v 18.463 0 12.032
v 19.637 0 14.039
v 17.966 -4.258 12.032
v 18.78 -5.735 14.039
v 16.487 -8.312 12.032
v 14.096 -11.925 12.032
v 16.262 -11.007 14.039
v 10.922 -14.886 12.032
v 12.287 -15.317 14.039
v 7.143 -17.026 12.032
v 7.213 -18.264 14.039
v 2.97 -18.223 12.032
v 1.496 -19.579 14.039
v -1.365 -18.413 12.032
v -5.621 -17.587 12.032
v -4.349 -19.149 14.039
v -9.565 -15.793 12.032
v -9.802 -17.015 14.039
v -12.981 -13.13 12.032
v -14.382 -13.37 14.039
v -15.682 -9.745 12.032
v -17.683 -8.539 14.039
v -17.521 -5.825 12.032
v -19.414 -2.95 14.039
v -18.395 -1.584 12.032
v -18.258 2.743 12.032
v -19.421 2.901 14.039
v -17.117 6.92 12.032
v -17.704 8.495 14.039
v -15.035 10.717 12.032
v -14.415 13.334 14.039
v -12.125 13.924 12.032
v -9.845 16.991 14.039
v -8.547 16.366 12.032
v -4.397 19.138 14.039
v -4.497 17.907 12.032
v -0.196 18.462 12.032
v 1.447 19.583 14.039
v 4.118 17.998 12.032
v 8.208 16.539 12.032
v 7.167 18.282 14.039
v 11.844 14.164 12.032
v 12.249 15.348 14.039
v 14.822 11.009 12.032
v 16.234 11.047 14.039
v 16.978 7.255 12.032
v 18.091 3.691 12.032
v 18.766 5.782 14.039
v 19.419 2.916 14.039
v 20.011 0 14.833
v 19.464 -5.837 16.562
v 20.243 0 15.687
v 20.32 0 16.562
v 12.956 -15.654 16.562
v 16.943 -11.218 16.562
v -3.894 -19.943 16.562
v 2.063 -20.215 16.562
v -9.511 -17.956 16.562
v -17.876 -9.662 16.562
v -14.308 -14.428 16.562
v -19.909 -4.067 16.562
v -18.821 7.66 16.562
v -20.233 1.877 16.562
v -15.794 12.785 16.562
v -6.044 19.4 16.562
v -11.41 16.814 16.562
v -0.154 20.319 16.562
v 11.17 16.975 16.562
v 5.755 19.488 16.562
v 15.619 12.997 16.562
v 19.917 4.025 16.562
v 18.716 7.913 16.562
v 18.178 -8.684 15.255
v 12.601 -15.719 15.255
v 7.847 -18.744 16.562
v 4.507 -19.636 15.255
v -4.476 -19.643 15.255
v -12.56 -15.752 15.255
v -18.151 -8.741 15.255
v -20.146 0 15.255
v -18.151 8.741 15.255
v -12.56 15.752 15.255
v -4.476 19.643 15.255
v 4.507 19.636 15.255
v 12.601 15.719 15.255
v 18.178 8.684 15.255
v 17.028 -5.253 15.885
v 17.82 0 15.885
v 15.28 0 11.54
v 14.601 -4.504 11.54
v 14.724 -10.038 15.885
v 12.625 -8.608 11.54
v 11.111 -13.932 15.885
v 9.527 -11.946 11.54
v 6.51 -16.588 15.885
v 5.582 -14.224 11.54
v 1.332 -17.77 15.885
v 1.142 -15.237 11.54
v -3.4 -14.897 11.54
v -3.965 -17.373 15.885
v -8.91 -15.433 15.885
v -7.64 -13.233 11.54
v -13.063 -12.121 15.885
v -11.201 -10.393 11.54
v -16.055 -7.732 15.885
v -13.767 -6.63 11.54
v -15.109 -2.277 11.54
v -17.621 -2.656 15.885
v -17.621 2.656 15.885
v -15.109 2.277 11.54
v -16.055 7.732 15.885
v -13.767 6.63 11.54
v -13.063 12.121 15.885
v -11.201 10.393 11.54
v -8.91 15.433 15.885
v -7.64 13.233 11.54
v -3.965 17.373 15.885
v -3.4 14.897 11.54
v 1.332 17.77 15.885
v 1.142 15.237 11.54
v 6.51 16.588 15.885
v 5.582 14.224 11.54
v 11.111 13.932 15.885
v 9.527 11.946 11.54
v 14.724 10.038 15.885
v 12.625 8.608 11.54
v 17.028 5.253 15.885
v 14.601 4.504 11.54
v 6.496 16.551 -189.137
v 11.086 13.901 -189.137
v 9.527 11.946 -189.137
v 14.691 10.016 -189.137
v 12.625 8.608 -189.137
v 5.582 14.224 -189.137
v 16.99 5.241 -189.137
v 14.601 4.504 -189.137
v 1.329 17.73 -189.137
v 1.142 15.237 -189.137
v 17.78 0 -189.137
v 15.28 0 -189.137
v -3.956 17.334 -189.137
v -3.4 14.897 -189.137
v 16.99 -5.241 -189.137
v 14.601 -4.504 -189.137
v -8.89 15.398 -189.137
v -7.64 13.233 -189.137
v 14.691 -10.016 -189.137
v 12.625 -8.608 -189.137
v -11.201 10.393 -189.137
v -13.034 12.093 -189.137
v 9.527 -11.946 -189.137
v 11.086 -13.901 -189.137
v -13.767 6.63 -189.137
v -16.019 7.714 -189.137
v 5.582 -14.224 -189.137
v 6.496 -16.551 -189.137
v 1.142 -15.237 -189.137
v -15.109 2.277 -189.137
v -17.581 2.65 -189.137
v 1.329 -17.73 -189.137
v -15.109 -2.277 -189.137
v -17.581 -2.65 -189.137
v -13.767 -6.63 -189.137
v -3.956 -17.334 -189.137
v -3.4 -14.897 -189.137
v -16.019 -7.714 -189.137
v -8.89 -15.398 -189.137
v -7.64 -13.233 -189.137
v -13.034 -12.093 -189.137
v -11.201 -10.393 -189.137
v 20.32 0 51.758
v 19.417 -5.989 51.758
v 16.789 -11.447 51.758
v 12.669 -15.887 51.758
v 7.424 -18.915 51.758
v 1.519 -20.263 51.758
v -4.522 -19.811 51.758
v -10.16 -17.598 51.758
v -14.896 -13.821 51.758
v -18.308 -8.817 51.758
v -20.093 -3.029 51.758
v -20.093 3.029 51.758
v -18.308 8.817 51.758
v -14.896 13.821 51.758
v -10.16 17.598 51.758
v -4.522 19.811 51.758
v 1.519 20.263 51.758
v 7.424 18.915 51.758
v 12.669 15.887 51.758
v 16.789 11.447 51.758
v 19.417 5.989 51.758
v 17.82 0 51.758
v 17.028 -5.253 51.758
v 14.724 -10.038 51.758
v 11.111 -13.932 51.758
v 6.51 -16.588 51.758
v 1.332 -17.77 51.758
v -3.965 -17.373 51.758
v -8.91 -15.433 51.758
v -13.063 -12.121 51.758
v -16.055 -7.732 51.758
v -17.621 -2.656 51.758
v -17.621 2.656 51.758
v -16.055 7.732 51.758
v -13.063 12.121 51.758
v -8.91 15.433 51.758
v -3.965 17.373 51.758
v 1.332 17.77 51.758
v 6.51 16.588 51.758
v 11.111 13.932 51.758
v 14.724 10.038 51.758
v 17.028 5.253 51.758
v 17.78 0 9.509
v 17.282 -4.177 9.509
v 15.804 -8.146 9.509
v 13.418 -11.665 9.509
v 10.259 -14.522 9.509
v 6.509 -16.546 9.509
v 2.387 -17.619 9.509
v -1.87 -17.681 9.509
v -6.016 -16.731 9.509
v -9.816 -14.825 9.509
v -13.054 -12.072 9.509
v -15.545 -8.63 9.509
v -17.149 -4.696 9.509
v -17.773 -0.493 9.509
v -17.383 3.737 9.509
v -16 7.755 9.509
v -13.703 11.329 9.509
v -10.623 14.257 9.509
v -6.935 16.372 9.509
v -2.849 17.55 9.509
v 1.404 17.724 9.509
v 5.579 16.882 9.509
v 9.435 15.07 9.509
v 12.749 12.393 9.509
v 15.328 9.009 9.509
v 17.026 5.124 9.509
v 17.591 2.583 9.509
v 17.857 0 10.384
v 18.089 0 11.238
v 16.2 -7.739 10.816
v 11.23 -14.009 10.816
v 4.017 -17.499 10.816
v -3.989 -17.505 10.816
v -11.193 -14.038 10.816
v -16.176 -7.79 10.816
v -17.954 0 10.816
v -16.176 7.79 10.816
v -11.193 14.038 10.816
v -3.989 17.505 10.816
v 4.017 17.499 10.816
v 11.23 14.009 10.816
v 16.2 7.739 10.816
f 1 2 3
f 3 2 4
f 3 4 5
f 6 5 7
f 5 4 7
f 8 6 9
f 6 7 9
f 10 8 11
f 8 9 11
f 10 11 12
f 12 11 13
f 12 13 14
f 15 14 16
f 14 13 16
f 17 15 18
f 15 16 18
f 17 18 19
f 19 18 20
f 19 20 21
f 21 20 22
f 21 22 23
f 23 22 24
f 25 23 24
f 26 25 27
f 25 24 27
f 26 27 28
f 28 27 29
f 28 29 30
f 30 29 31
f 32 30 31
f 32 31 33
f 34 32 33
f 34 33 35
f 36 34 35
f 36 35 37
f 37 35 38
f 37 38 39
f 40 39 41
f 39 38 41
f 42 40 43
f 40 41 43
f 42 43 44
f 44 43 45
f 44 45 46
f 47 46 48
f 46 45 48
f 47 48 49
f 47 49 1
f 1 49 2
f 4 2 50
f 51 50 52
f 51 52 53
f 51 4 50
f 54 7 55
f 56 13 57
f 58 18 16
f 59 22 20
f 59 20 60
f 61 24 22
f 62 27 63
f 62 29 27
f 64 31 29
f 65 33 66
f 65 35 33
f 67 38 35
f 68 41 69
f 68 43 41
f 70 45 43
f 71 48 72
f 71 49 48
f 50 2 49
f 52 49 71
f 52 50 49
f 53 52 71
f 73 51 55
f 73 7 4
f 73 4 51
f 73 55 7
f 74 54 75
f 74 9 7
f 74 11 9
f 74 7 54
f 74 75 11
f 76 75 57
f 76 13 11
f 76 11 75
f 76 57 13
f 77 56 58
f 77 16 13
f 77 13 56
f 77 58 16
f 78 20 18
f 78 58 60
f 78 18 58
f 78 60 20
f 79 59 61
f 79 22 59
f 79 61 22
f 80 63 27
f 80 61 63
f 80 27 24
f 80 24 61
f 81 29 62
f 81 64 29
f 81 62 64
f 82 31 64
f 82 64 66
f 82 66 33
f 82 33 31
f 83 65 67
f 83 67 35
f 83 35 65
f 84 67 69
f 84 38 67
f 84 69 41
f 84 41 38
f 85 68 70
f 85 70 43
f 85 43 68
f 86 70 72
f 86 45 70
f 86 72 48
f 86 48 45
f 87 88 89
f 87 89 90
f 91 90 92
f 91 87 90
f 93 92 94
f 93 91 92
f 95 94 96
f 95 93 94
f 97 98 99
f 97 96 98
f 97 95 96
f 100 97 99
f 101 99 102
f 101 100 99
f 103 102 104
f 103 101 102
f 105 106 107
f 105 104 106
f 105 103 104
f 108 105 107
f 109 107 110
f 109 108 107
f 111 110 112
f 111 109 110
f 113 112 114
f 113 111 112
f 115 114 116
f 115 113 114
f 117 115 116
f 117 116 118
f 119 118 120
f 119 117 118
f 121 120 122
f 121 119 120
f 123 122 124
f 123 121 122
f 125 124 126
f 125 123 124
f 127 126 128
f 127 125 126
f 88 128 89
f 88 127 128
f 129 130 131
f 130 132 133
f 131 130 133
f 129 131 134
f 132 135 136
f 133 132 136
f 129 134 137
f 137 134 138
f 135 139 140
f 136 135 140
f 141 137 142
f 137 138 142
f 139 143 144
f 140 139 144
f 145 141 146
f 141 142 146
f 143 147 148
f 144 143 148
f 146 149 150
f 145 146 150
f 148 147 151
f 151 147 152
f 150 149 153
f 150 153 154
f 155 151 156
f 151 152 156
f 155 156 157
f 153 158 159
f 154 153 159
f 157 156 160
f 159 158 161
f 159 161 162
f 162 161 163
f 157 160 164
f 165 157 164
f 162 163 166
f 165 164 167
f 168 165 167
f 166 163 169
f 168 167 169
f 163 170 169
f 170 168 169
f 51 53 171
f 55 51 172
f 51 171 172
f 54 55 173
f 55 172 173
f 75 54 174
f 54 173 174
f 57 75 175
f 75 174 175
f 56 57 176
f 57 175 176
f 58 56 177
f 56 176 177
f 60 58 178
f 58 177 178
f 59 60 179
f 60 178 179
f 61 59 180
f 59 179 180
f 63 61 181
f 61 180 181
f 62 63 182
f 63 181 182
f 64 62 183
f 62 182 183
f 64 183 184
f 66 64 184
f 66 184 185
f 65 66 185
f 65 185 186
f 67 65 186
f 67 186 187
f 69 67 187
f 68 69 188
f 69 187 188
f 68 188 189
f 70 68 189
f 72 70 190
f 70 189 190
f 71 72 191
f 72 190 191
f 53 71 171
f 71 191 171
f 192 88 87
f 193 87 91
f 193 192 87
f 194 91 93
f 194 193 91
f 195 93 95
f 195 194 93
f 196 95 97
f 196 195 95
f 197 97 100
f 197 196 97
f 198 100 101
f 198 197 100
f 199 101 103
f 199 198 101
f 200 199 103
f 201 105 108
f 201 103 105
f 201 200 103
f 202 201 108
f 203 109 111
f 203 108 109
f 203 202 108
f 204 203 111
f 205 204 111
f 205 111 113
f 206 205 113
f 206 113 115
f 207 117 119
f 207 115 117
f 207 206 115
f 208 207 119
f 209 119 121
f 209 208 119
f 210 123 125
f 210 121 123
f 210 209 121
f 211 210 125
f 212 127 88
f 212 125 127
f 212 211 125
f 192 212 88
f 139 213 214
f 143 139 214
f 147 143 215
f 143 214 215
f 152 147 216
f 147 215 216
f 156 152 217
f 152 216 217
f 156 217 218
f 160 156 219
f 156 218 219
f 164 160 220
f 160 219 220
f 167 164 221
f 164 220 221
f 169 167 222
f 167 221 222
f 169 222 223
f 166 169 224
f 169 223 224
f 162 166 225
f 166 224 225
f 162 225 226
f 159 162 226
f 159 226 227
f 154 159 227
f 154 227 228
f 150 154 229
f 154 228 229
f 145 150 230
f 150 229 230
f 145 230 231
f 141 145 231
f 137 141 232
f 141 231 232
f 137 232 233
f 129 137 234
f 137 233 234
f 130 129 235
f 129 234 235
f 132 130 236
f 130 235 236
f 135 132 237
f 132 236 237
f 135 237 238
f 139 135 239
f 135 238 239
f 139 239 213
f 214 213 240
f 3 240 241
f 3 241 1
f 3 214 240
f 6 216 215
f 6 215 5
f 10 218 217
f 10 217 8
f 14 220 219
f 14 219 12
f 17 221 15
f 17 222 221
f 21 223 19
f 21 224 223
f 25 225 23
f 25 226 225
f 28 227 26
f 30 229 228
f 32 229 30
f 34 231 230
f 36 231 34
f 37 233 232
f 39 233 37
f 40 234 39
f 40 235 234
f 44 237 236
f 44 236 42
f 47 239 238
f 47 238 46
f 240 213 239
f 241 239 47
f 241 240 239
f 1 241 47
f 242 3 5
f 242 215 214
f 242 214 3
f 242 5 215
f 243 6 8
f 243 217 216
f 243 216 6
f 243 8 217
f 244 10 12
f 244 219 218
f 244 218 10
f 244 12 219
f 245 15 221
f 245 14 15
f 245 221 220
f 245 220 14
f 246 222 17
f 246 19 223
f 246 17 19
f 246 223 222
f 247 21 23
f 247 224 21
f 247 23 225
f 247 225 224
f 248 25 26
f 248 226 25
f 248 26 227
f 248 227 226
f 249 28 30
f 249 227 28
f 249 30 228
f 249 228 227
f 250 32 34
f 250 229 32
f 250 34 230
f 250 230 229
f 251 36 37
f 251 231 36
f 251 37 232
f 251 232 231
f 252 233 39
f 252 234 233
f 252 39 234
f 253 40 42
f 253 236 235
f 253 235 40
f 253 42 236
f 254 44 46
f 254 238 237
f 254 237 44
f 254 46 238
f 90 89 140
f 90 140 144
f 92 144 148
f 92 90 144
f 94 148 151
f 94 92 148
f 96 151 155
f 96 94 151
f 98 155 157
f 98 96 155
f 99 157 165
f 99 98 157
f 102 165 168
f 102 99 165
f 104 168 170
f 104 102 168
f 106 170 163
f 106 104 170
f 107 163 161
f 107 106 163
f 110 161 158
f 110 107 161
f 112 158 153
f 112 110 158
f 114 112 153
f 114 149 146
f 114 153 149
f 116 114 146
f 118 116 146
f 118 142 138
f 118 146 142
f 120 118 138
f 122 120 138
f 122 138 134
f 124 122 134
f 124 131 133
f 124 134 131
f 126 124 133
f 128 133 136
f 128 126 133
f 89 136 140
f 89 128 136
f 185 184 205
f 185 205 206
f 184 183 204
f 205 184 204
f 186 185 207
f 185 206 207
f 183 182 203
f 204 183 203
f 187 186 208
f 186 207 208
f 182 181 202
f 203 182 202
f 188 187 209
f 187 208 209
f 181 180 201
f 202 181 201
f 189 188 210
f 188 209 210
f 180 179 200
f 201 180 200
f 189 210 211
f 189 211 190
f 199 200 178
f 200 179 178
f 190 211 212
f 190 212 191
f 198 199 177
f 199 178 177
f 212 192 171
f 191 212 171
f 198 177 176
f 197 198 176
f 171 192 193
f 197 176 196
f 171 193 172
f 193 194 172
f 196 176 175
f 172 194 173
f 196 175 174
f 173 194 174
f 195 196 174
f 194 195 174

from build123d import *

# Parameters (mm, degrees)
F2_T = -2.5
F3_R = 5


with BuildPart() as f1:
    # F0 (on Front) → F1 (revolve)
    with BuildSketch(Plane.XZ):
        Polygon((20.32, 15.2080524429), (20.32, 51.7584940429), (0, 51.7584940429), (0, -189.1371041323), (17.78, -189.1371041323), (17.78, 10.8628958677), align=None)
    revolve(axis=Axis((0, 0, -68.6893050447), (0, 0, -1)))

    # F2
    f2_openings = [f1.faces().sort_by_distance(p)[0] for p in [
        (0, 0, 51.758494),
        (0, 0, -189.137104),
    ]]
    offset(amount=F2_T, openings=f2_openings, kind=Kind.INTERSECTION)

    # F3
    f3_edges = [f1.edges().sort_by_distance(p)[0] for p in [
        (-17.78, 0, 10.862896),
        (-20.32, 0, 15.208052),
        (19.05, 0, 13.035474),
    ]]
    fillet(f3_edges, radius=F3_R)


solid = f1.part
